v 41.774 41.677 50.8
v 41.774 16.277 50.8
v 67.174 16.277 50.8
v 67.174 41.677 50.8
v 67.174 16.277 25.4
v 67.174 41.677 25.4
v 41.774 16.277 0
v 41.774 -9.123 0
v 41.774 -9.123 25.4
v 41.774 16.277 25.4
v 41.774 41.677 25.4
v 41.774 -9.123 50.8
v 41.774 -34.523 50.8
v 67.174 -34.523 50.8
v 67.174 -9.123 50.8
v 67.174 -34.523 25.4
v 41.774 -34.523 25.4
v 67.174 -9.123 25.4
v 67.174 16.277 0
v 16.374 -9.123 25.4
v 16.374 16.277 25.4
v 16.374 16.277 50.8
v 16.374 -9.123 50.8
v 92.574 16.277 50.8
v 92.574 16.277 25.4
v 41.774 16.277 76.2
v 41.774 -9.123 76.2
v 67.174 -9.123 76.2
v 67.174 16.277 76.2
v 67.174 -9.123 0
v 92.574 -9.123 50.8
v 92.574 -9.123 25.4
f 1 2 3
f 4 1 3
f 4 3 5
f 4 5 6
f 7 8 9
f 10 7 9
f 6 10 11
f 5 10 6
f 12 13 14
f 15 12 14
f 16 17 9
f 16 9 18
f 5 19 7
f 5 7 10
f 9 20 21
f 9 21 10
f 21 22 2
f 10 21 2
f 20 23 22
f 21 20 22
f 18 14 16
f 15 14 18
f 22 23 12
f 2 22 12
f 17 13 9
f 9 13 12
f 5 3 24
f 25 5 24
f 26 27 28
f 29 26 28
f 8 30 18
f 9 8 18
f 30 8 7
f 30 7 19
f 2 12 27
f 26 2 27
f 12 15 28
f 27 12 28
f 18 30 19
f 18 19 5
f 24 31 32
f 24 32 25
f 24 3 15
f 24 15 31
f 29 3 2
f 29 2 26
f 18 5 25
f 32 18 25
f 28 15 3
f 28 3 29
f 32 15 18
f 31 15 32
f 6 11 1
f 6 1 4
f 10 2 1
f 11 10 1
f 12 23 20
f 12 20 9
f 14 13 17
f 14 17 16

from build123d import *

# Parameters (mm, degrees)
F0_R      = 13.9889248678
F1_DEPTH  = 25.4
F2_SIZE   = 12.69999
F3_W      = 76.2
F3_H      = 76.2
F4_DEPTH  = 76.2
F5_W      = 25.4
F5_H      = 25.4
F7_DEPTH  = 76.2
F8_W      = 25.4
F8_H      = 25.4
F9_DEPTH  = 76.2
F10_W     = 25.4
F10_H     = 25.4
F11_DEPTH = 76.2


# Not quite as in the source:
# - a fillet or chamfer is up to 0.001 mm smaller than in the source, because OpenCascade refuses the exact size


with BuildPart() as f1:
    # F0 (on Top) → F1 (new body)
    with BuildSketch(Plane.XY):
        with Locations((-42.8192056715, -23.4777331352)):
            Circle(F0_R)
    extrude(amount=F1_DEPTH)

    # F2 (size 12.7 in the source; OpenCascade refuses exactly that, so slightly less here)
    f2_edges = [f1.edges().sort_by_distance(p)[0] for p in [
        (-28.830281, -23.477733, 12.7),
        (-56.808131, -23.477733, 0),
        (-56.808131, -23.477733, 25.4),
    ]]
    chamfer(f2_edges, length=F2_SIZE)


with BuildPart() as f4:
    # F3 (on Top) → F4 (new body)
    with BuildSketch(Plane.XY):
        with Locations((54.4739740274, 3.576669842)):
            Rectangle(F3_W, F3_H)
    extrude(amount=F4_DEPTH)

    # F5 (on face) → F7 (cut)
    with BuildSketch(Plane.XZ.offset(34.523330158)):
        with Locations((29.0739740274, 63.5)):
            Rectangle(F5_W, F5_H)
        with Locations((79.8739740274, 63.5)):
            Rectangle(F5_W, F5_H)
        with Locations((79.8739740274, 12.7)):
            Rectangle(F5_W, F5_H)
        with Locations((29.0739740274, 12.7)):
            Rectangle(F5_W, F5_H)
    extrude(amount=-F7_DEPTH, mode=Mode.SUBTRACT)

    # F8 (on face) → F9 (cut)
    with BuildSketch(Plane.YZ.offset(92.5739740274)):
        with Locations((-21.823330158, 12.7)):
            Rectangle(F8_W, F8_H)
        with Locations((-21.823330158, 63.5)):
            Rectangle(F8_W, F8_H)
        with Locations((28.976669842, 63.5)):
            Rectangle(F8_W, F8_H)
        with Locations((28.976669842, 12.7)):
            Rectangle(F8_W, F8_H)
    extrude(amount=-F9_DEPTH, mode=Mode.SUBTRACT)

    # F10 (on face) → F11 (cut)
    with BuildSketch(Plane.XY.offset(50.8)):
        with Locations((79.8739740274, -21.823330158)):
            Rectangle(F10_W, F10_H)
        with Locations((79.8739740274, 28.976669842)):
            Rectangle(F10_W, F10_H)
        with Locations((29.0739740274, 28.976669842)):
            Rectangle(F10_W, F10_H)
        with Locations((29.0739740274, -21.823330158)):
            Rectangle(F10_W, F10_H)
    extrude(amount=-F11_DEPTH, mode=Mode.SUBTRACT)


solid = f4.part
